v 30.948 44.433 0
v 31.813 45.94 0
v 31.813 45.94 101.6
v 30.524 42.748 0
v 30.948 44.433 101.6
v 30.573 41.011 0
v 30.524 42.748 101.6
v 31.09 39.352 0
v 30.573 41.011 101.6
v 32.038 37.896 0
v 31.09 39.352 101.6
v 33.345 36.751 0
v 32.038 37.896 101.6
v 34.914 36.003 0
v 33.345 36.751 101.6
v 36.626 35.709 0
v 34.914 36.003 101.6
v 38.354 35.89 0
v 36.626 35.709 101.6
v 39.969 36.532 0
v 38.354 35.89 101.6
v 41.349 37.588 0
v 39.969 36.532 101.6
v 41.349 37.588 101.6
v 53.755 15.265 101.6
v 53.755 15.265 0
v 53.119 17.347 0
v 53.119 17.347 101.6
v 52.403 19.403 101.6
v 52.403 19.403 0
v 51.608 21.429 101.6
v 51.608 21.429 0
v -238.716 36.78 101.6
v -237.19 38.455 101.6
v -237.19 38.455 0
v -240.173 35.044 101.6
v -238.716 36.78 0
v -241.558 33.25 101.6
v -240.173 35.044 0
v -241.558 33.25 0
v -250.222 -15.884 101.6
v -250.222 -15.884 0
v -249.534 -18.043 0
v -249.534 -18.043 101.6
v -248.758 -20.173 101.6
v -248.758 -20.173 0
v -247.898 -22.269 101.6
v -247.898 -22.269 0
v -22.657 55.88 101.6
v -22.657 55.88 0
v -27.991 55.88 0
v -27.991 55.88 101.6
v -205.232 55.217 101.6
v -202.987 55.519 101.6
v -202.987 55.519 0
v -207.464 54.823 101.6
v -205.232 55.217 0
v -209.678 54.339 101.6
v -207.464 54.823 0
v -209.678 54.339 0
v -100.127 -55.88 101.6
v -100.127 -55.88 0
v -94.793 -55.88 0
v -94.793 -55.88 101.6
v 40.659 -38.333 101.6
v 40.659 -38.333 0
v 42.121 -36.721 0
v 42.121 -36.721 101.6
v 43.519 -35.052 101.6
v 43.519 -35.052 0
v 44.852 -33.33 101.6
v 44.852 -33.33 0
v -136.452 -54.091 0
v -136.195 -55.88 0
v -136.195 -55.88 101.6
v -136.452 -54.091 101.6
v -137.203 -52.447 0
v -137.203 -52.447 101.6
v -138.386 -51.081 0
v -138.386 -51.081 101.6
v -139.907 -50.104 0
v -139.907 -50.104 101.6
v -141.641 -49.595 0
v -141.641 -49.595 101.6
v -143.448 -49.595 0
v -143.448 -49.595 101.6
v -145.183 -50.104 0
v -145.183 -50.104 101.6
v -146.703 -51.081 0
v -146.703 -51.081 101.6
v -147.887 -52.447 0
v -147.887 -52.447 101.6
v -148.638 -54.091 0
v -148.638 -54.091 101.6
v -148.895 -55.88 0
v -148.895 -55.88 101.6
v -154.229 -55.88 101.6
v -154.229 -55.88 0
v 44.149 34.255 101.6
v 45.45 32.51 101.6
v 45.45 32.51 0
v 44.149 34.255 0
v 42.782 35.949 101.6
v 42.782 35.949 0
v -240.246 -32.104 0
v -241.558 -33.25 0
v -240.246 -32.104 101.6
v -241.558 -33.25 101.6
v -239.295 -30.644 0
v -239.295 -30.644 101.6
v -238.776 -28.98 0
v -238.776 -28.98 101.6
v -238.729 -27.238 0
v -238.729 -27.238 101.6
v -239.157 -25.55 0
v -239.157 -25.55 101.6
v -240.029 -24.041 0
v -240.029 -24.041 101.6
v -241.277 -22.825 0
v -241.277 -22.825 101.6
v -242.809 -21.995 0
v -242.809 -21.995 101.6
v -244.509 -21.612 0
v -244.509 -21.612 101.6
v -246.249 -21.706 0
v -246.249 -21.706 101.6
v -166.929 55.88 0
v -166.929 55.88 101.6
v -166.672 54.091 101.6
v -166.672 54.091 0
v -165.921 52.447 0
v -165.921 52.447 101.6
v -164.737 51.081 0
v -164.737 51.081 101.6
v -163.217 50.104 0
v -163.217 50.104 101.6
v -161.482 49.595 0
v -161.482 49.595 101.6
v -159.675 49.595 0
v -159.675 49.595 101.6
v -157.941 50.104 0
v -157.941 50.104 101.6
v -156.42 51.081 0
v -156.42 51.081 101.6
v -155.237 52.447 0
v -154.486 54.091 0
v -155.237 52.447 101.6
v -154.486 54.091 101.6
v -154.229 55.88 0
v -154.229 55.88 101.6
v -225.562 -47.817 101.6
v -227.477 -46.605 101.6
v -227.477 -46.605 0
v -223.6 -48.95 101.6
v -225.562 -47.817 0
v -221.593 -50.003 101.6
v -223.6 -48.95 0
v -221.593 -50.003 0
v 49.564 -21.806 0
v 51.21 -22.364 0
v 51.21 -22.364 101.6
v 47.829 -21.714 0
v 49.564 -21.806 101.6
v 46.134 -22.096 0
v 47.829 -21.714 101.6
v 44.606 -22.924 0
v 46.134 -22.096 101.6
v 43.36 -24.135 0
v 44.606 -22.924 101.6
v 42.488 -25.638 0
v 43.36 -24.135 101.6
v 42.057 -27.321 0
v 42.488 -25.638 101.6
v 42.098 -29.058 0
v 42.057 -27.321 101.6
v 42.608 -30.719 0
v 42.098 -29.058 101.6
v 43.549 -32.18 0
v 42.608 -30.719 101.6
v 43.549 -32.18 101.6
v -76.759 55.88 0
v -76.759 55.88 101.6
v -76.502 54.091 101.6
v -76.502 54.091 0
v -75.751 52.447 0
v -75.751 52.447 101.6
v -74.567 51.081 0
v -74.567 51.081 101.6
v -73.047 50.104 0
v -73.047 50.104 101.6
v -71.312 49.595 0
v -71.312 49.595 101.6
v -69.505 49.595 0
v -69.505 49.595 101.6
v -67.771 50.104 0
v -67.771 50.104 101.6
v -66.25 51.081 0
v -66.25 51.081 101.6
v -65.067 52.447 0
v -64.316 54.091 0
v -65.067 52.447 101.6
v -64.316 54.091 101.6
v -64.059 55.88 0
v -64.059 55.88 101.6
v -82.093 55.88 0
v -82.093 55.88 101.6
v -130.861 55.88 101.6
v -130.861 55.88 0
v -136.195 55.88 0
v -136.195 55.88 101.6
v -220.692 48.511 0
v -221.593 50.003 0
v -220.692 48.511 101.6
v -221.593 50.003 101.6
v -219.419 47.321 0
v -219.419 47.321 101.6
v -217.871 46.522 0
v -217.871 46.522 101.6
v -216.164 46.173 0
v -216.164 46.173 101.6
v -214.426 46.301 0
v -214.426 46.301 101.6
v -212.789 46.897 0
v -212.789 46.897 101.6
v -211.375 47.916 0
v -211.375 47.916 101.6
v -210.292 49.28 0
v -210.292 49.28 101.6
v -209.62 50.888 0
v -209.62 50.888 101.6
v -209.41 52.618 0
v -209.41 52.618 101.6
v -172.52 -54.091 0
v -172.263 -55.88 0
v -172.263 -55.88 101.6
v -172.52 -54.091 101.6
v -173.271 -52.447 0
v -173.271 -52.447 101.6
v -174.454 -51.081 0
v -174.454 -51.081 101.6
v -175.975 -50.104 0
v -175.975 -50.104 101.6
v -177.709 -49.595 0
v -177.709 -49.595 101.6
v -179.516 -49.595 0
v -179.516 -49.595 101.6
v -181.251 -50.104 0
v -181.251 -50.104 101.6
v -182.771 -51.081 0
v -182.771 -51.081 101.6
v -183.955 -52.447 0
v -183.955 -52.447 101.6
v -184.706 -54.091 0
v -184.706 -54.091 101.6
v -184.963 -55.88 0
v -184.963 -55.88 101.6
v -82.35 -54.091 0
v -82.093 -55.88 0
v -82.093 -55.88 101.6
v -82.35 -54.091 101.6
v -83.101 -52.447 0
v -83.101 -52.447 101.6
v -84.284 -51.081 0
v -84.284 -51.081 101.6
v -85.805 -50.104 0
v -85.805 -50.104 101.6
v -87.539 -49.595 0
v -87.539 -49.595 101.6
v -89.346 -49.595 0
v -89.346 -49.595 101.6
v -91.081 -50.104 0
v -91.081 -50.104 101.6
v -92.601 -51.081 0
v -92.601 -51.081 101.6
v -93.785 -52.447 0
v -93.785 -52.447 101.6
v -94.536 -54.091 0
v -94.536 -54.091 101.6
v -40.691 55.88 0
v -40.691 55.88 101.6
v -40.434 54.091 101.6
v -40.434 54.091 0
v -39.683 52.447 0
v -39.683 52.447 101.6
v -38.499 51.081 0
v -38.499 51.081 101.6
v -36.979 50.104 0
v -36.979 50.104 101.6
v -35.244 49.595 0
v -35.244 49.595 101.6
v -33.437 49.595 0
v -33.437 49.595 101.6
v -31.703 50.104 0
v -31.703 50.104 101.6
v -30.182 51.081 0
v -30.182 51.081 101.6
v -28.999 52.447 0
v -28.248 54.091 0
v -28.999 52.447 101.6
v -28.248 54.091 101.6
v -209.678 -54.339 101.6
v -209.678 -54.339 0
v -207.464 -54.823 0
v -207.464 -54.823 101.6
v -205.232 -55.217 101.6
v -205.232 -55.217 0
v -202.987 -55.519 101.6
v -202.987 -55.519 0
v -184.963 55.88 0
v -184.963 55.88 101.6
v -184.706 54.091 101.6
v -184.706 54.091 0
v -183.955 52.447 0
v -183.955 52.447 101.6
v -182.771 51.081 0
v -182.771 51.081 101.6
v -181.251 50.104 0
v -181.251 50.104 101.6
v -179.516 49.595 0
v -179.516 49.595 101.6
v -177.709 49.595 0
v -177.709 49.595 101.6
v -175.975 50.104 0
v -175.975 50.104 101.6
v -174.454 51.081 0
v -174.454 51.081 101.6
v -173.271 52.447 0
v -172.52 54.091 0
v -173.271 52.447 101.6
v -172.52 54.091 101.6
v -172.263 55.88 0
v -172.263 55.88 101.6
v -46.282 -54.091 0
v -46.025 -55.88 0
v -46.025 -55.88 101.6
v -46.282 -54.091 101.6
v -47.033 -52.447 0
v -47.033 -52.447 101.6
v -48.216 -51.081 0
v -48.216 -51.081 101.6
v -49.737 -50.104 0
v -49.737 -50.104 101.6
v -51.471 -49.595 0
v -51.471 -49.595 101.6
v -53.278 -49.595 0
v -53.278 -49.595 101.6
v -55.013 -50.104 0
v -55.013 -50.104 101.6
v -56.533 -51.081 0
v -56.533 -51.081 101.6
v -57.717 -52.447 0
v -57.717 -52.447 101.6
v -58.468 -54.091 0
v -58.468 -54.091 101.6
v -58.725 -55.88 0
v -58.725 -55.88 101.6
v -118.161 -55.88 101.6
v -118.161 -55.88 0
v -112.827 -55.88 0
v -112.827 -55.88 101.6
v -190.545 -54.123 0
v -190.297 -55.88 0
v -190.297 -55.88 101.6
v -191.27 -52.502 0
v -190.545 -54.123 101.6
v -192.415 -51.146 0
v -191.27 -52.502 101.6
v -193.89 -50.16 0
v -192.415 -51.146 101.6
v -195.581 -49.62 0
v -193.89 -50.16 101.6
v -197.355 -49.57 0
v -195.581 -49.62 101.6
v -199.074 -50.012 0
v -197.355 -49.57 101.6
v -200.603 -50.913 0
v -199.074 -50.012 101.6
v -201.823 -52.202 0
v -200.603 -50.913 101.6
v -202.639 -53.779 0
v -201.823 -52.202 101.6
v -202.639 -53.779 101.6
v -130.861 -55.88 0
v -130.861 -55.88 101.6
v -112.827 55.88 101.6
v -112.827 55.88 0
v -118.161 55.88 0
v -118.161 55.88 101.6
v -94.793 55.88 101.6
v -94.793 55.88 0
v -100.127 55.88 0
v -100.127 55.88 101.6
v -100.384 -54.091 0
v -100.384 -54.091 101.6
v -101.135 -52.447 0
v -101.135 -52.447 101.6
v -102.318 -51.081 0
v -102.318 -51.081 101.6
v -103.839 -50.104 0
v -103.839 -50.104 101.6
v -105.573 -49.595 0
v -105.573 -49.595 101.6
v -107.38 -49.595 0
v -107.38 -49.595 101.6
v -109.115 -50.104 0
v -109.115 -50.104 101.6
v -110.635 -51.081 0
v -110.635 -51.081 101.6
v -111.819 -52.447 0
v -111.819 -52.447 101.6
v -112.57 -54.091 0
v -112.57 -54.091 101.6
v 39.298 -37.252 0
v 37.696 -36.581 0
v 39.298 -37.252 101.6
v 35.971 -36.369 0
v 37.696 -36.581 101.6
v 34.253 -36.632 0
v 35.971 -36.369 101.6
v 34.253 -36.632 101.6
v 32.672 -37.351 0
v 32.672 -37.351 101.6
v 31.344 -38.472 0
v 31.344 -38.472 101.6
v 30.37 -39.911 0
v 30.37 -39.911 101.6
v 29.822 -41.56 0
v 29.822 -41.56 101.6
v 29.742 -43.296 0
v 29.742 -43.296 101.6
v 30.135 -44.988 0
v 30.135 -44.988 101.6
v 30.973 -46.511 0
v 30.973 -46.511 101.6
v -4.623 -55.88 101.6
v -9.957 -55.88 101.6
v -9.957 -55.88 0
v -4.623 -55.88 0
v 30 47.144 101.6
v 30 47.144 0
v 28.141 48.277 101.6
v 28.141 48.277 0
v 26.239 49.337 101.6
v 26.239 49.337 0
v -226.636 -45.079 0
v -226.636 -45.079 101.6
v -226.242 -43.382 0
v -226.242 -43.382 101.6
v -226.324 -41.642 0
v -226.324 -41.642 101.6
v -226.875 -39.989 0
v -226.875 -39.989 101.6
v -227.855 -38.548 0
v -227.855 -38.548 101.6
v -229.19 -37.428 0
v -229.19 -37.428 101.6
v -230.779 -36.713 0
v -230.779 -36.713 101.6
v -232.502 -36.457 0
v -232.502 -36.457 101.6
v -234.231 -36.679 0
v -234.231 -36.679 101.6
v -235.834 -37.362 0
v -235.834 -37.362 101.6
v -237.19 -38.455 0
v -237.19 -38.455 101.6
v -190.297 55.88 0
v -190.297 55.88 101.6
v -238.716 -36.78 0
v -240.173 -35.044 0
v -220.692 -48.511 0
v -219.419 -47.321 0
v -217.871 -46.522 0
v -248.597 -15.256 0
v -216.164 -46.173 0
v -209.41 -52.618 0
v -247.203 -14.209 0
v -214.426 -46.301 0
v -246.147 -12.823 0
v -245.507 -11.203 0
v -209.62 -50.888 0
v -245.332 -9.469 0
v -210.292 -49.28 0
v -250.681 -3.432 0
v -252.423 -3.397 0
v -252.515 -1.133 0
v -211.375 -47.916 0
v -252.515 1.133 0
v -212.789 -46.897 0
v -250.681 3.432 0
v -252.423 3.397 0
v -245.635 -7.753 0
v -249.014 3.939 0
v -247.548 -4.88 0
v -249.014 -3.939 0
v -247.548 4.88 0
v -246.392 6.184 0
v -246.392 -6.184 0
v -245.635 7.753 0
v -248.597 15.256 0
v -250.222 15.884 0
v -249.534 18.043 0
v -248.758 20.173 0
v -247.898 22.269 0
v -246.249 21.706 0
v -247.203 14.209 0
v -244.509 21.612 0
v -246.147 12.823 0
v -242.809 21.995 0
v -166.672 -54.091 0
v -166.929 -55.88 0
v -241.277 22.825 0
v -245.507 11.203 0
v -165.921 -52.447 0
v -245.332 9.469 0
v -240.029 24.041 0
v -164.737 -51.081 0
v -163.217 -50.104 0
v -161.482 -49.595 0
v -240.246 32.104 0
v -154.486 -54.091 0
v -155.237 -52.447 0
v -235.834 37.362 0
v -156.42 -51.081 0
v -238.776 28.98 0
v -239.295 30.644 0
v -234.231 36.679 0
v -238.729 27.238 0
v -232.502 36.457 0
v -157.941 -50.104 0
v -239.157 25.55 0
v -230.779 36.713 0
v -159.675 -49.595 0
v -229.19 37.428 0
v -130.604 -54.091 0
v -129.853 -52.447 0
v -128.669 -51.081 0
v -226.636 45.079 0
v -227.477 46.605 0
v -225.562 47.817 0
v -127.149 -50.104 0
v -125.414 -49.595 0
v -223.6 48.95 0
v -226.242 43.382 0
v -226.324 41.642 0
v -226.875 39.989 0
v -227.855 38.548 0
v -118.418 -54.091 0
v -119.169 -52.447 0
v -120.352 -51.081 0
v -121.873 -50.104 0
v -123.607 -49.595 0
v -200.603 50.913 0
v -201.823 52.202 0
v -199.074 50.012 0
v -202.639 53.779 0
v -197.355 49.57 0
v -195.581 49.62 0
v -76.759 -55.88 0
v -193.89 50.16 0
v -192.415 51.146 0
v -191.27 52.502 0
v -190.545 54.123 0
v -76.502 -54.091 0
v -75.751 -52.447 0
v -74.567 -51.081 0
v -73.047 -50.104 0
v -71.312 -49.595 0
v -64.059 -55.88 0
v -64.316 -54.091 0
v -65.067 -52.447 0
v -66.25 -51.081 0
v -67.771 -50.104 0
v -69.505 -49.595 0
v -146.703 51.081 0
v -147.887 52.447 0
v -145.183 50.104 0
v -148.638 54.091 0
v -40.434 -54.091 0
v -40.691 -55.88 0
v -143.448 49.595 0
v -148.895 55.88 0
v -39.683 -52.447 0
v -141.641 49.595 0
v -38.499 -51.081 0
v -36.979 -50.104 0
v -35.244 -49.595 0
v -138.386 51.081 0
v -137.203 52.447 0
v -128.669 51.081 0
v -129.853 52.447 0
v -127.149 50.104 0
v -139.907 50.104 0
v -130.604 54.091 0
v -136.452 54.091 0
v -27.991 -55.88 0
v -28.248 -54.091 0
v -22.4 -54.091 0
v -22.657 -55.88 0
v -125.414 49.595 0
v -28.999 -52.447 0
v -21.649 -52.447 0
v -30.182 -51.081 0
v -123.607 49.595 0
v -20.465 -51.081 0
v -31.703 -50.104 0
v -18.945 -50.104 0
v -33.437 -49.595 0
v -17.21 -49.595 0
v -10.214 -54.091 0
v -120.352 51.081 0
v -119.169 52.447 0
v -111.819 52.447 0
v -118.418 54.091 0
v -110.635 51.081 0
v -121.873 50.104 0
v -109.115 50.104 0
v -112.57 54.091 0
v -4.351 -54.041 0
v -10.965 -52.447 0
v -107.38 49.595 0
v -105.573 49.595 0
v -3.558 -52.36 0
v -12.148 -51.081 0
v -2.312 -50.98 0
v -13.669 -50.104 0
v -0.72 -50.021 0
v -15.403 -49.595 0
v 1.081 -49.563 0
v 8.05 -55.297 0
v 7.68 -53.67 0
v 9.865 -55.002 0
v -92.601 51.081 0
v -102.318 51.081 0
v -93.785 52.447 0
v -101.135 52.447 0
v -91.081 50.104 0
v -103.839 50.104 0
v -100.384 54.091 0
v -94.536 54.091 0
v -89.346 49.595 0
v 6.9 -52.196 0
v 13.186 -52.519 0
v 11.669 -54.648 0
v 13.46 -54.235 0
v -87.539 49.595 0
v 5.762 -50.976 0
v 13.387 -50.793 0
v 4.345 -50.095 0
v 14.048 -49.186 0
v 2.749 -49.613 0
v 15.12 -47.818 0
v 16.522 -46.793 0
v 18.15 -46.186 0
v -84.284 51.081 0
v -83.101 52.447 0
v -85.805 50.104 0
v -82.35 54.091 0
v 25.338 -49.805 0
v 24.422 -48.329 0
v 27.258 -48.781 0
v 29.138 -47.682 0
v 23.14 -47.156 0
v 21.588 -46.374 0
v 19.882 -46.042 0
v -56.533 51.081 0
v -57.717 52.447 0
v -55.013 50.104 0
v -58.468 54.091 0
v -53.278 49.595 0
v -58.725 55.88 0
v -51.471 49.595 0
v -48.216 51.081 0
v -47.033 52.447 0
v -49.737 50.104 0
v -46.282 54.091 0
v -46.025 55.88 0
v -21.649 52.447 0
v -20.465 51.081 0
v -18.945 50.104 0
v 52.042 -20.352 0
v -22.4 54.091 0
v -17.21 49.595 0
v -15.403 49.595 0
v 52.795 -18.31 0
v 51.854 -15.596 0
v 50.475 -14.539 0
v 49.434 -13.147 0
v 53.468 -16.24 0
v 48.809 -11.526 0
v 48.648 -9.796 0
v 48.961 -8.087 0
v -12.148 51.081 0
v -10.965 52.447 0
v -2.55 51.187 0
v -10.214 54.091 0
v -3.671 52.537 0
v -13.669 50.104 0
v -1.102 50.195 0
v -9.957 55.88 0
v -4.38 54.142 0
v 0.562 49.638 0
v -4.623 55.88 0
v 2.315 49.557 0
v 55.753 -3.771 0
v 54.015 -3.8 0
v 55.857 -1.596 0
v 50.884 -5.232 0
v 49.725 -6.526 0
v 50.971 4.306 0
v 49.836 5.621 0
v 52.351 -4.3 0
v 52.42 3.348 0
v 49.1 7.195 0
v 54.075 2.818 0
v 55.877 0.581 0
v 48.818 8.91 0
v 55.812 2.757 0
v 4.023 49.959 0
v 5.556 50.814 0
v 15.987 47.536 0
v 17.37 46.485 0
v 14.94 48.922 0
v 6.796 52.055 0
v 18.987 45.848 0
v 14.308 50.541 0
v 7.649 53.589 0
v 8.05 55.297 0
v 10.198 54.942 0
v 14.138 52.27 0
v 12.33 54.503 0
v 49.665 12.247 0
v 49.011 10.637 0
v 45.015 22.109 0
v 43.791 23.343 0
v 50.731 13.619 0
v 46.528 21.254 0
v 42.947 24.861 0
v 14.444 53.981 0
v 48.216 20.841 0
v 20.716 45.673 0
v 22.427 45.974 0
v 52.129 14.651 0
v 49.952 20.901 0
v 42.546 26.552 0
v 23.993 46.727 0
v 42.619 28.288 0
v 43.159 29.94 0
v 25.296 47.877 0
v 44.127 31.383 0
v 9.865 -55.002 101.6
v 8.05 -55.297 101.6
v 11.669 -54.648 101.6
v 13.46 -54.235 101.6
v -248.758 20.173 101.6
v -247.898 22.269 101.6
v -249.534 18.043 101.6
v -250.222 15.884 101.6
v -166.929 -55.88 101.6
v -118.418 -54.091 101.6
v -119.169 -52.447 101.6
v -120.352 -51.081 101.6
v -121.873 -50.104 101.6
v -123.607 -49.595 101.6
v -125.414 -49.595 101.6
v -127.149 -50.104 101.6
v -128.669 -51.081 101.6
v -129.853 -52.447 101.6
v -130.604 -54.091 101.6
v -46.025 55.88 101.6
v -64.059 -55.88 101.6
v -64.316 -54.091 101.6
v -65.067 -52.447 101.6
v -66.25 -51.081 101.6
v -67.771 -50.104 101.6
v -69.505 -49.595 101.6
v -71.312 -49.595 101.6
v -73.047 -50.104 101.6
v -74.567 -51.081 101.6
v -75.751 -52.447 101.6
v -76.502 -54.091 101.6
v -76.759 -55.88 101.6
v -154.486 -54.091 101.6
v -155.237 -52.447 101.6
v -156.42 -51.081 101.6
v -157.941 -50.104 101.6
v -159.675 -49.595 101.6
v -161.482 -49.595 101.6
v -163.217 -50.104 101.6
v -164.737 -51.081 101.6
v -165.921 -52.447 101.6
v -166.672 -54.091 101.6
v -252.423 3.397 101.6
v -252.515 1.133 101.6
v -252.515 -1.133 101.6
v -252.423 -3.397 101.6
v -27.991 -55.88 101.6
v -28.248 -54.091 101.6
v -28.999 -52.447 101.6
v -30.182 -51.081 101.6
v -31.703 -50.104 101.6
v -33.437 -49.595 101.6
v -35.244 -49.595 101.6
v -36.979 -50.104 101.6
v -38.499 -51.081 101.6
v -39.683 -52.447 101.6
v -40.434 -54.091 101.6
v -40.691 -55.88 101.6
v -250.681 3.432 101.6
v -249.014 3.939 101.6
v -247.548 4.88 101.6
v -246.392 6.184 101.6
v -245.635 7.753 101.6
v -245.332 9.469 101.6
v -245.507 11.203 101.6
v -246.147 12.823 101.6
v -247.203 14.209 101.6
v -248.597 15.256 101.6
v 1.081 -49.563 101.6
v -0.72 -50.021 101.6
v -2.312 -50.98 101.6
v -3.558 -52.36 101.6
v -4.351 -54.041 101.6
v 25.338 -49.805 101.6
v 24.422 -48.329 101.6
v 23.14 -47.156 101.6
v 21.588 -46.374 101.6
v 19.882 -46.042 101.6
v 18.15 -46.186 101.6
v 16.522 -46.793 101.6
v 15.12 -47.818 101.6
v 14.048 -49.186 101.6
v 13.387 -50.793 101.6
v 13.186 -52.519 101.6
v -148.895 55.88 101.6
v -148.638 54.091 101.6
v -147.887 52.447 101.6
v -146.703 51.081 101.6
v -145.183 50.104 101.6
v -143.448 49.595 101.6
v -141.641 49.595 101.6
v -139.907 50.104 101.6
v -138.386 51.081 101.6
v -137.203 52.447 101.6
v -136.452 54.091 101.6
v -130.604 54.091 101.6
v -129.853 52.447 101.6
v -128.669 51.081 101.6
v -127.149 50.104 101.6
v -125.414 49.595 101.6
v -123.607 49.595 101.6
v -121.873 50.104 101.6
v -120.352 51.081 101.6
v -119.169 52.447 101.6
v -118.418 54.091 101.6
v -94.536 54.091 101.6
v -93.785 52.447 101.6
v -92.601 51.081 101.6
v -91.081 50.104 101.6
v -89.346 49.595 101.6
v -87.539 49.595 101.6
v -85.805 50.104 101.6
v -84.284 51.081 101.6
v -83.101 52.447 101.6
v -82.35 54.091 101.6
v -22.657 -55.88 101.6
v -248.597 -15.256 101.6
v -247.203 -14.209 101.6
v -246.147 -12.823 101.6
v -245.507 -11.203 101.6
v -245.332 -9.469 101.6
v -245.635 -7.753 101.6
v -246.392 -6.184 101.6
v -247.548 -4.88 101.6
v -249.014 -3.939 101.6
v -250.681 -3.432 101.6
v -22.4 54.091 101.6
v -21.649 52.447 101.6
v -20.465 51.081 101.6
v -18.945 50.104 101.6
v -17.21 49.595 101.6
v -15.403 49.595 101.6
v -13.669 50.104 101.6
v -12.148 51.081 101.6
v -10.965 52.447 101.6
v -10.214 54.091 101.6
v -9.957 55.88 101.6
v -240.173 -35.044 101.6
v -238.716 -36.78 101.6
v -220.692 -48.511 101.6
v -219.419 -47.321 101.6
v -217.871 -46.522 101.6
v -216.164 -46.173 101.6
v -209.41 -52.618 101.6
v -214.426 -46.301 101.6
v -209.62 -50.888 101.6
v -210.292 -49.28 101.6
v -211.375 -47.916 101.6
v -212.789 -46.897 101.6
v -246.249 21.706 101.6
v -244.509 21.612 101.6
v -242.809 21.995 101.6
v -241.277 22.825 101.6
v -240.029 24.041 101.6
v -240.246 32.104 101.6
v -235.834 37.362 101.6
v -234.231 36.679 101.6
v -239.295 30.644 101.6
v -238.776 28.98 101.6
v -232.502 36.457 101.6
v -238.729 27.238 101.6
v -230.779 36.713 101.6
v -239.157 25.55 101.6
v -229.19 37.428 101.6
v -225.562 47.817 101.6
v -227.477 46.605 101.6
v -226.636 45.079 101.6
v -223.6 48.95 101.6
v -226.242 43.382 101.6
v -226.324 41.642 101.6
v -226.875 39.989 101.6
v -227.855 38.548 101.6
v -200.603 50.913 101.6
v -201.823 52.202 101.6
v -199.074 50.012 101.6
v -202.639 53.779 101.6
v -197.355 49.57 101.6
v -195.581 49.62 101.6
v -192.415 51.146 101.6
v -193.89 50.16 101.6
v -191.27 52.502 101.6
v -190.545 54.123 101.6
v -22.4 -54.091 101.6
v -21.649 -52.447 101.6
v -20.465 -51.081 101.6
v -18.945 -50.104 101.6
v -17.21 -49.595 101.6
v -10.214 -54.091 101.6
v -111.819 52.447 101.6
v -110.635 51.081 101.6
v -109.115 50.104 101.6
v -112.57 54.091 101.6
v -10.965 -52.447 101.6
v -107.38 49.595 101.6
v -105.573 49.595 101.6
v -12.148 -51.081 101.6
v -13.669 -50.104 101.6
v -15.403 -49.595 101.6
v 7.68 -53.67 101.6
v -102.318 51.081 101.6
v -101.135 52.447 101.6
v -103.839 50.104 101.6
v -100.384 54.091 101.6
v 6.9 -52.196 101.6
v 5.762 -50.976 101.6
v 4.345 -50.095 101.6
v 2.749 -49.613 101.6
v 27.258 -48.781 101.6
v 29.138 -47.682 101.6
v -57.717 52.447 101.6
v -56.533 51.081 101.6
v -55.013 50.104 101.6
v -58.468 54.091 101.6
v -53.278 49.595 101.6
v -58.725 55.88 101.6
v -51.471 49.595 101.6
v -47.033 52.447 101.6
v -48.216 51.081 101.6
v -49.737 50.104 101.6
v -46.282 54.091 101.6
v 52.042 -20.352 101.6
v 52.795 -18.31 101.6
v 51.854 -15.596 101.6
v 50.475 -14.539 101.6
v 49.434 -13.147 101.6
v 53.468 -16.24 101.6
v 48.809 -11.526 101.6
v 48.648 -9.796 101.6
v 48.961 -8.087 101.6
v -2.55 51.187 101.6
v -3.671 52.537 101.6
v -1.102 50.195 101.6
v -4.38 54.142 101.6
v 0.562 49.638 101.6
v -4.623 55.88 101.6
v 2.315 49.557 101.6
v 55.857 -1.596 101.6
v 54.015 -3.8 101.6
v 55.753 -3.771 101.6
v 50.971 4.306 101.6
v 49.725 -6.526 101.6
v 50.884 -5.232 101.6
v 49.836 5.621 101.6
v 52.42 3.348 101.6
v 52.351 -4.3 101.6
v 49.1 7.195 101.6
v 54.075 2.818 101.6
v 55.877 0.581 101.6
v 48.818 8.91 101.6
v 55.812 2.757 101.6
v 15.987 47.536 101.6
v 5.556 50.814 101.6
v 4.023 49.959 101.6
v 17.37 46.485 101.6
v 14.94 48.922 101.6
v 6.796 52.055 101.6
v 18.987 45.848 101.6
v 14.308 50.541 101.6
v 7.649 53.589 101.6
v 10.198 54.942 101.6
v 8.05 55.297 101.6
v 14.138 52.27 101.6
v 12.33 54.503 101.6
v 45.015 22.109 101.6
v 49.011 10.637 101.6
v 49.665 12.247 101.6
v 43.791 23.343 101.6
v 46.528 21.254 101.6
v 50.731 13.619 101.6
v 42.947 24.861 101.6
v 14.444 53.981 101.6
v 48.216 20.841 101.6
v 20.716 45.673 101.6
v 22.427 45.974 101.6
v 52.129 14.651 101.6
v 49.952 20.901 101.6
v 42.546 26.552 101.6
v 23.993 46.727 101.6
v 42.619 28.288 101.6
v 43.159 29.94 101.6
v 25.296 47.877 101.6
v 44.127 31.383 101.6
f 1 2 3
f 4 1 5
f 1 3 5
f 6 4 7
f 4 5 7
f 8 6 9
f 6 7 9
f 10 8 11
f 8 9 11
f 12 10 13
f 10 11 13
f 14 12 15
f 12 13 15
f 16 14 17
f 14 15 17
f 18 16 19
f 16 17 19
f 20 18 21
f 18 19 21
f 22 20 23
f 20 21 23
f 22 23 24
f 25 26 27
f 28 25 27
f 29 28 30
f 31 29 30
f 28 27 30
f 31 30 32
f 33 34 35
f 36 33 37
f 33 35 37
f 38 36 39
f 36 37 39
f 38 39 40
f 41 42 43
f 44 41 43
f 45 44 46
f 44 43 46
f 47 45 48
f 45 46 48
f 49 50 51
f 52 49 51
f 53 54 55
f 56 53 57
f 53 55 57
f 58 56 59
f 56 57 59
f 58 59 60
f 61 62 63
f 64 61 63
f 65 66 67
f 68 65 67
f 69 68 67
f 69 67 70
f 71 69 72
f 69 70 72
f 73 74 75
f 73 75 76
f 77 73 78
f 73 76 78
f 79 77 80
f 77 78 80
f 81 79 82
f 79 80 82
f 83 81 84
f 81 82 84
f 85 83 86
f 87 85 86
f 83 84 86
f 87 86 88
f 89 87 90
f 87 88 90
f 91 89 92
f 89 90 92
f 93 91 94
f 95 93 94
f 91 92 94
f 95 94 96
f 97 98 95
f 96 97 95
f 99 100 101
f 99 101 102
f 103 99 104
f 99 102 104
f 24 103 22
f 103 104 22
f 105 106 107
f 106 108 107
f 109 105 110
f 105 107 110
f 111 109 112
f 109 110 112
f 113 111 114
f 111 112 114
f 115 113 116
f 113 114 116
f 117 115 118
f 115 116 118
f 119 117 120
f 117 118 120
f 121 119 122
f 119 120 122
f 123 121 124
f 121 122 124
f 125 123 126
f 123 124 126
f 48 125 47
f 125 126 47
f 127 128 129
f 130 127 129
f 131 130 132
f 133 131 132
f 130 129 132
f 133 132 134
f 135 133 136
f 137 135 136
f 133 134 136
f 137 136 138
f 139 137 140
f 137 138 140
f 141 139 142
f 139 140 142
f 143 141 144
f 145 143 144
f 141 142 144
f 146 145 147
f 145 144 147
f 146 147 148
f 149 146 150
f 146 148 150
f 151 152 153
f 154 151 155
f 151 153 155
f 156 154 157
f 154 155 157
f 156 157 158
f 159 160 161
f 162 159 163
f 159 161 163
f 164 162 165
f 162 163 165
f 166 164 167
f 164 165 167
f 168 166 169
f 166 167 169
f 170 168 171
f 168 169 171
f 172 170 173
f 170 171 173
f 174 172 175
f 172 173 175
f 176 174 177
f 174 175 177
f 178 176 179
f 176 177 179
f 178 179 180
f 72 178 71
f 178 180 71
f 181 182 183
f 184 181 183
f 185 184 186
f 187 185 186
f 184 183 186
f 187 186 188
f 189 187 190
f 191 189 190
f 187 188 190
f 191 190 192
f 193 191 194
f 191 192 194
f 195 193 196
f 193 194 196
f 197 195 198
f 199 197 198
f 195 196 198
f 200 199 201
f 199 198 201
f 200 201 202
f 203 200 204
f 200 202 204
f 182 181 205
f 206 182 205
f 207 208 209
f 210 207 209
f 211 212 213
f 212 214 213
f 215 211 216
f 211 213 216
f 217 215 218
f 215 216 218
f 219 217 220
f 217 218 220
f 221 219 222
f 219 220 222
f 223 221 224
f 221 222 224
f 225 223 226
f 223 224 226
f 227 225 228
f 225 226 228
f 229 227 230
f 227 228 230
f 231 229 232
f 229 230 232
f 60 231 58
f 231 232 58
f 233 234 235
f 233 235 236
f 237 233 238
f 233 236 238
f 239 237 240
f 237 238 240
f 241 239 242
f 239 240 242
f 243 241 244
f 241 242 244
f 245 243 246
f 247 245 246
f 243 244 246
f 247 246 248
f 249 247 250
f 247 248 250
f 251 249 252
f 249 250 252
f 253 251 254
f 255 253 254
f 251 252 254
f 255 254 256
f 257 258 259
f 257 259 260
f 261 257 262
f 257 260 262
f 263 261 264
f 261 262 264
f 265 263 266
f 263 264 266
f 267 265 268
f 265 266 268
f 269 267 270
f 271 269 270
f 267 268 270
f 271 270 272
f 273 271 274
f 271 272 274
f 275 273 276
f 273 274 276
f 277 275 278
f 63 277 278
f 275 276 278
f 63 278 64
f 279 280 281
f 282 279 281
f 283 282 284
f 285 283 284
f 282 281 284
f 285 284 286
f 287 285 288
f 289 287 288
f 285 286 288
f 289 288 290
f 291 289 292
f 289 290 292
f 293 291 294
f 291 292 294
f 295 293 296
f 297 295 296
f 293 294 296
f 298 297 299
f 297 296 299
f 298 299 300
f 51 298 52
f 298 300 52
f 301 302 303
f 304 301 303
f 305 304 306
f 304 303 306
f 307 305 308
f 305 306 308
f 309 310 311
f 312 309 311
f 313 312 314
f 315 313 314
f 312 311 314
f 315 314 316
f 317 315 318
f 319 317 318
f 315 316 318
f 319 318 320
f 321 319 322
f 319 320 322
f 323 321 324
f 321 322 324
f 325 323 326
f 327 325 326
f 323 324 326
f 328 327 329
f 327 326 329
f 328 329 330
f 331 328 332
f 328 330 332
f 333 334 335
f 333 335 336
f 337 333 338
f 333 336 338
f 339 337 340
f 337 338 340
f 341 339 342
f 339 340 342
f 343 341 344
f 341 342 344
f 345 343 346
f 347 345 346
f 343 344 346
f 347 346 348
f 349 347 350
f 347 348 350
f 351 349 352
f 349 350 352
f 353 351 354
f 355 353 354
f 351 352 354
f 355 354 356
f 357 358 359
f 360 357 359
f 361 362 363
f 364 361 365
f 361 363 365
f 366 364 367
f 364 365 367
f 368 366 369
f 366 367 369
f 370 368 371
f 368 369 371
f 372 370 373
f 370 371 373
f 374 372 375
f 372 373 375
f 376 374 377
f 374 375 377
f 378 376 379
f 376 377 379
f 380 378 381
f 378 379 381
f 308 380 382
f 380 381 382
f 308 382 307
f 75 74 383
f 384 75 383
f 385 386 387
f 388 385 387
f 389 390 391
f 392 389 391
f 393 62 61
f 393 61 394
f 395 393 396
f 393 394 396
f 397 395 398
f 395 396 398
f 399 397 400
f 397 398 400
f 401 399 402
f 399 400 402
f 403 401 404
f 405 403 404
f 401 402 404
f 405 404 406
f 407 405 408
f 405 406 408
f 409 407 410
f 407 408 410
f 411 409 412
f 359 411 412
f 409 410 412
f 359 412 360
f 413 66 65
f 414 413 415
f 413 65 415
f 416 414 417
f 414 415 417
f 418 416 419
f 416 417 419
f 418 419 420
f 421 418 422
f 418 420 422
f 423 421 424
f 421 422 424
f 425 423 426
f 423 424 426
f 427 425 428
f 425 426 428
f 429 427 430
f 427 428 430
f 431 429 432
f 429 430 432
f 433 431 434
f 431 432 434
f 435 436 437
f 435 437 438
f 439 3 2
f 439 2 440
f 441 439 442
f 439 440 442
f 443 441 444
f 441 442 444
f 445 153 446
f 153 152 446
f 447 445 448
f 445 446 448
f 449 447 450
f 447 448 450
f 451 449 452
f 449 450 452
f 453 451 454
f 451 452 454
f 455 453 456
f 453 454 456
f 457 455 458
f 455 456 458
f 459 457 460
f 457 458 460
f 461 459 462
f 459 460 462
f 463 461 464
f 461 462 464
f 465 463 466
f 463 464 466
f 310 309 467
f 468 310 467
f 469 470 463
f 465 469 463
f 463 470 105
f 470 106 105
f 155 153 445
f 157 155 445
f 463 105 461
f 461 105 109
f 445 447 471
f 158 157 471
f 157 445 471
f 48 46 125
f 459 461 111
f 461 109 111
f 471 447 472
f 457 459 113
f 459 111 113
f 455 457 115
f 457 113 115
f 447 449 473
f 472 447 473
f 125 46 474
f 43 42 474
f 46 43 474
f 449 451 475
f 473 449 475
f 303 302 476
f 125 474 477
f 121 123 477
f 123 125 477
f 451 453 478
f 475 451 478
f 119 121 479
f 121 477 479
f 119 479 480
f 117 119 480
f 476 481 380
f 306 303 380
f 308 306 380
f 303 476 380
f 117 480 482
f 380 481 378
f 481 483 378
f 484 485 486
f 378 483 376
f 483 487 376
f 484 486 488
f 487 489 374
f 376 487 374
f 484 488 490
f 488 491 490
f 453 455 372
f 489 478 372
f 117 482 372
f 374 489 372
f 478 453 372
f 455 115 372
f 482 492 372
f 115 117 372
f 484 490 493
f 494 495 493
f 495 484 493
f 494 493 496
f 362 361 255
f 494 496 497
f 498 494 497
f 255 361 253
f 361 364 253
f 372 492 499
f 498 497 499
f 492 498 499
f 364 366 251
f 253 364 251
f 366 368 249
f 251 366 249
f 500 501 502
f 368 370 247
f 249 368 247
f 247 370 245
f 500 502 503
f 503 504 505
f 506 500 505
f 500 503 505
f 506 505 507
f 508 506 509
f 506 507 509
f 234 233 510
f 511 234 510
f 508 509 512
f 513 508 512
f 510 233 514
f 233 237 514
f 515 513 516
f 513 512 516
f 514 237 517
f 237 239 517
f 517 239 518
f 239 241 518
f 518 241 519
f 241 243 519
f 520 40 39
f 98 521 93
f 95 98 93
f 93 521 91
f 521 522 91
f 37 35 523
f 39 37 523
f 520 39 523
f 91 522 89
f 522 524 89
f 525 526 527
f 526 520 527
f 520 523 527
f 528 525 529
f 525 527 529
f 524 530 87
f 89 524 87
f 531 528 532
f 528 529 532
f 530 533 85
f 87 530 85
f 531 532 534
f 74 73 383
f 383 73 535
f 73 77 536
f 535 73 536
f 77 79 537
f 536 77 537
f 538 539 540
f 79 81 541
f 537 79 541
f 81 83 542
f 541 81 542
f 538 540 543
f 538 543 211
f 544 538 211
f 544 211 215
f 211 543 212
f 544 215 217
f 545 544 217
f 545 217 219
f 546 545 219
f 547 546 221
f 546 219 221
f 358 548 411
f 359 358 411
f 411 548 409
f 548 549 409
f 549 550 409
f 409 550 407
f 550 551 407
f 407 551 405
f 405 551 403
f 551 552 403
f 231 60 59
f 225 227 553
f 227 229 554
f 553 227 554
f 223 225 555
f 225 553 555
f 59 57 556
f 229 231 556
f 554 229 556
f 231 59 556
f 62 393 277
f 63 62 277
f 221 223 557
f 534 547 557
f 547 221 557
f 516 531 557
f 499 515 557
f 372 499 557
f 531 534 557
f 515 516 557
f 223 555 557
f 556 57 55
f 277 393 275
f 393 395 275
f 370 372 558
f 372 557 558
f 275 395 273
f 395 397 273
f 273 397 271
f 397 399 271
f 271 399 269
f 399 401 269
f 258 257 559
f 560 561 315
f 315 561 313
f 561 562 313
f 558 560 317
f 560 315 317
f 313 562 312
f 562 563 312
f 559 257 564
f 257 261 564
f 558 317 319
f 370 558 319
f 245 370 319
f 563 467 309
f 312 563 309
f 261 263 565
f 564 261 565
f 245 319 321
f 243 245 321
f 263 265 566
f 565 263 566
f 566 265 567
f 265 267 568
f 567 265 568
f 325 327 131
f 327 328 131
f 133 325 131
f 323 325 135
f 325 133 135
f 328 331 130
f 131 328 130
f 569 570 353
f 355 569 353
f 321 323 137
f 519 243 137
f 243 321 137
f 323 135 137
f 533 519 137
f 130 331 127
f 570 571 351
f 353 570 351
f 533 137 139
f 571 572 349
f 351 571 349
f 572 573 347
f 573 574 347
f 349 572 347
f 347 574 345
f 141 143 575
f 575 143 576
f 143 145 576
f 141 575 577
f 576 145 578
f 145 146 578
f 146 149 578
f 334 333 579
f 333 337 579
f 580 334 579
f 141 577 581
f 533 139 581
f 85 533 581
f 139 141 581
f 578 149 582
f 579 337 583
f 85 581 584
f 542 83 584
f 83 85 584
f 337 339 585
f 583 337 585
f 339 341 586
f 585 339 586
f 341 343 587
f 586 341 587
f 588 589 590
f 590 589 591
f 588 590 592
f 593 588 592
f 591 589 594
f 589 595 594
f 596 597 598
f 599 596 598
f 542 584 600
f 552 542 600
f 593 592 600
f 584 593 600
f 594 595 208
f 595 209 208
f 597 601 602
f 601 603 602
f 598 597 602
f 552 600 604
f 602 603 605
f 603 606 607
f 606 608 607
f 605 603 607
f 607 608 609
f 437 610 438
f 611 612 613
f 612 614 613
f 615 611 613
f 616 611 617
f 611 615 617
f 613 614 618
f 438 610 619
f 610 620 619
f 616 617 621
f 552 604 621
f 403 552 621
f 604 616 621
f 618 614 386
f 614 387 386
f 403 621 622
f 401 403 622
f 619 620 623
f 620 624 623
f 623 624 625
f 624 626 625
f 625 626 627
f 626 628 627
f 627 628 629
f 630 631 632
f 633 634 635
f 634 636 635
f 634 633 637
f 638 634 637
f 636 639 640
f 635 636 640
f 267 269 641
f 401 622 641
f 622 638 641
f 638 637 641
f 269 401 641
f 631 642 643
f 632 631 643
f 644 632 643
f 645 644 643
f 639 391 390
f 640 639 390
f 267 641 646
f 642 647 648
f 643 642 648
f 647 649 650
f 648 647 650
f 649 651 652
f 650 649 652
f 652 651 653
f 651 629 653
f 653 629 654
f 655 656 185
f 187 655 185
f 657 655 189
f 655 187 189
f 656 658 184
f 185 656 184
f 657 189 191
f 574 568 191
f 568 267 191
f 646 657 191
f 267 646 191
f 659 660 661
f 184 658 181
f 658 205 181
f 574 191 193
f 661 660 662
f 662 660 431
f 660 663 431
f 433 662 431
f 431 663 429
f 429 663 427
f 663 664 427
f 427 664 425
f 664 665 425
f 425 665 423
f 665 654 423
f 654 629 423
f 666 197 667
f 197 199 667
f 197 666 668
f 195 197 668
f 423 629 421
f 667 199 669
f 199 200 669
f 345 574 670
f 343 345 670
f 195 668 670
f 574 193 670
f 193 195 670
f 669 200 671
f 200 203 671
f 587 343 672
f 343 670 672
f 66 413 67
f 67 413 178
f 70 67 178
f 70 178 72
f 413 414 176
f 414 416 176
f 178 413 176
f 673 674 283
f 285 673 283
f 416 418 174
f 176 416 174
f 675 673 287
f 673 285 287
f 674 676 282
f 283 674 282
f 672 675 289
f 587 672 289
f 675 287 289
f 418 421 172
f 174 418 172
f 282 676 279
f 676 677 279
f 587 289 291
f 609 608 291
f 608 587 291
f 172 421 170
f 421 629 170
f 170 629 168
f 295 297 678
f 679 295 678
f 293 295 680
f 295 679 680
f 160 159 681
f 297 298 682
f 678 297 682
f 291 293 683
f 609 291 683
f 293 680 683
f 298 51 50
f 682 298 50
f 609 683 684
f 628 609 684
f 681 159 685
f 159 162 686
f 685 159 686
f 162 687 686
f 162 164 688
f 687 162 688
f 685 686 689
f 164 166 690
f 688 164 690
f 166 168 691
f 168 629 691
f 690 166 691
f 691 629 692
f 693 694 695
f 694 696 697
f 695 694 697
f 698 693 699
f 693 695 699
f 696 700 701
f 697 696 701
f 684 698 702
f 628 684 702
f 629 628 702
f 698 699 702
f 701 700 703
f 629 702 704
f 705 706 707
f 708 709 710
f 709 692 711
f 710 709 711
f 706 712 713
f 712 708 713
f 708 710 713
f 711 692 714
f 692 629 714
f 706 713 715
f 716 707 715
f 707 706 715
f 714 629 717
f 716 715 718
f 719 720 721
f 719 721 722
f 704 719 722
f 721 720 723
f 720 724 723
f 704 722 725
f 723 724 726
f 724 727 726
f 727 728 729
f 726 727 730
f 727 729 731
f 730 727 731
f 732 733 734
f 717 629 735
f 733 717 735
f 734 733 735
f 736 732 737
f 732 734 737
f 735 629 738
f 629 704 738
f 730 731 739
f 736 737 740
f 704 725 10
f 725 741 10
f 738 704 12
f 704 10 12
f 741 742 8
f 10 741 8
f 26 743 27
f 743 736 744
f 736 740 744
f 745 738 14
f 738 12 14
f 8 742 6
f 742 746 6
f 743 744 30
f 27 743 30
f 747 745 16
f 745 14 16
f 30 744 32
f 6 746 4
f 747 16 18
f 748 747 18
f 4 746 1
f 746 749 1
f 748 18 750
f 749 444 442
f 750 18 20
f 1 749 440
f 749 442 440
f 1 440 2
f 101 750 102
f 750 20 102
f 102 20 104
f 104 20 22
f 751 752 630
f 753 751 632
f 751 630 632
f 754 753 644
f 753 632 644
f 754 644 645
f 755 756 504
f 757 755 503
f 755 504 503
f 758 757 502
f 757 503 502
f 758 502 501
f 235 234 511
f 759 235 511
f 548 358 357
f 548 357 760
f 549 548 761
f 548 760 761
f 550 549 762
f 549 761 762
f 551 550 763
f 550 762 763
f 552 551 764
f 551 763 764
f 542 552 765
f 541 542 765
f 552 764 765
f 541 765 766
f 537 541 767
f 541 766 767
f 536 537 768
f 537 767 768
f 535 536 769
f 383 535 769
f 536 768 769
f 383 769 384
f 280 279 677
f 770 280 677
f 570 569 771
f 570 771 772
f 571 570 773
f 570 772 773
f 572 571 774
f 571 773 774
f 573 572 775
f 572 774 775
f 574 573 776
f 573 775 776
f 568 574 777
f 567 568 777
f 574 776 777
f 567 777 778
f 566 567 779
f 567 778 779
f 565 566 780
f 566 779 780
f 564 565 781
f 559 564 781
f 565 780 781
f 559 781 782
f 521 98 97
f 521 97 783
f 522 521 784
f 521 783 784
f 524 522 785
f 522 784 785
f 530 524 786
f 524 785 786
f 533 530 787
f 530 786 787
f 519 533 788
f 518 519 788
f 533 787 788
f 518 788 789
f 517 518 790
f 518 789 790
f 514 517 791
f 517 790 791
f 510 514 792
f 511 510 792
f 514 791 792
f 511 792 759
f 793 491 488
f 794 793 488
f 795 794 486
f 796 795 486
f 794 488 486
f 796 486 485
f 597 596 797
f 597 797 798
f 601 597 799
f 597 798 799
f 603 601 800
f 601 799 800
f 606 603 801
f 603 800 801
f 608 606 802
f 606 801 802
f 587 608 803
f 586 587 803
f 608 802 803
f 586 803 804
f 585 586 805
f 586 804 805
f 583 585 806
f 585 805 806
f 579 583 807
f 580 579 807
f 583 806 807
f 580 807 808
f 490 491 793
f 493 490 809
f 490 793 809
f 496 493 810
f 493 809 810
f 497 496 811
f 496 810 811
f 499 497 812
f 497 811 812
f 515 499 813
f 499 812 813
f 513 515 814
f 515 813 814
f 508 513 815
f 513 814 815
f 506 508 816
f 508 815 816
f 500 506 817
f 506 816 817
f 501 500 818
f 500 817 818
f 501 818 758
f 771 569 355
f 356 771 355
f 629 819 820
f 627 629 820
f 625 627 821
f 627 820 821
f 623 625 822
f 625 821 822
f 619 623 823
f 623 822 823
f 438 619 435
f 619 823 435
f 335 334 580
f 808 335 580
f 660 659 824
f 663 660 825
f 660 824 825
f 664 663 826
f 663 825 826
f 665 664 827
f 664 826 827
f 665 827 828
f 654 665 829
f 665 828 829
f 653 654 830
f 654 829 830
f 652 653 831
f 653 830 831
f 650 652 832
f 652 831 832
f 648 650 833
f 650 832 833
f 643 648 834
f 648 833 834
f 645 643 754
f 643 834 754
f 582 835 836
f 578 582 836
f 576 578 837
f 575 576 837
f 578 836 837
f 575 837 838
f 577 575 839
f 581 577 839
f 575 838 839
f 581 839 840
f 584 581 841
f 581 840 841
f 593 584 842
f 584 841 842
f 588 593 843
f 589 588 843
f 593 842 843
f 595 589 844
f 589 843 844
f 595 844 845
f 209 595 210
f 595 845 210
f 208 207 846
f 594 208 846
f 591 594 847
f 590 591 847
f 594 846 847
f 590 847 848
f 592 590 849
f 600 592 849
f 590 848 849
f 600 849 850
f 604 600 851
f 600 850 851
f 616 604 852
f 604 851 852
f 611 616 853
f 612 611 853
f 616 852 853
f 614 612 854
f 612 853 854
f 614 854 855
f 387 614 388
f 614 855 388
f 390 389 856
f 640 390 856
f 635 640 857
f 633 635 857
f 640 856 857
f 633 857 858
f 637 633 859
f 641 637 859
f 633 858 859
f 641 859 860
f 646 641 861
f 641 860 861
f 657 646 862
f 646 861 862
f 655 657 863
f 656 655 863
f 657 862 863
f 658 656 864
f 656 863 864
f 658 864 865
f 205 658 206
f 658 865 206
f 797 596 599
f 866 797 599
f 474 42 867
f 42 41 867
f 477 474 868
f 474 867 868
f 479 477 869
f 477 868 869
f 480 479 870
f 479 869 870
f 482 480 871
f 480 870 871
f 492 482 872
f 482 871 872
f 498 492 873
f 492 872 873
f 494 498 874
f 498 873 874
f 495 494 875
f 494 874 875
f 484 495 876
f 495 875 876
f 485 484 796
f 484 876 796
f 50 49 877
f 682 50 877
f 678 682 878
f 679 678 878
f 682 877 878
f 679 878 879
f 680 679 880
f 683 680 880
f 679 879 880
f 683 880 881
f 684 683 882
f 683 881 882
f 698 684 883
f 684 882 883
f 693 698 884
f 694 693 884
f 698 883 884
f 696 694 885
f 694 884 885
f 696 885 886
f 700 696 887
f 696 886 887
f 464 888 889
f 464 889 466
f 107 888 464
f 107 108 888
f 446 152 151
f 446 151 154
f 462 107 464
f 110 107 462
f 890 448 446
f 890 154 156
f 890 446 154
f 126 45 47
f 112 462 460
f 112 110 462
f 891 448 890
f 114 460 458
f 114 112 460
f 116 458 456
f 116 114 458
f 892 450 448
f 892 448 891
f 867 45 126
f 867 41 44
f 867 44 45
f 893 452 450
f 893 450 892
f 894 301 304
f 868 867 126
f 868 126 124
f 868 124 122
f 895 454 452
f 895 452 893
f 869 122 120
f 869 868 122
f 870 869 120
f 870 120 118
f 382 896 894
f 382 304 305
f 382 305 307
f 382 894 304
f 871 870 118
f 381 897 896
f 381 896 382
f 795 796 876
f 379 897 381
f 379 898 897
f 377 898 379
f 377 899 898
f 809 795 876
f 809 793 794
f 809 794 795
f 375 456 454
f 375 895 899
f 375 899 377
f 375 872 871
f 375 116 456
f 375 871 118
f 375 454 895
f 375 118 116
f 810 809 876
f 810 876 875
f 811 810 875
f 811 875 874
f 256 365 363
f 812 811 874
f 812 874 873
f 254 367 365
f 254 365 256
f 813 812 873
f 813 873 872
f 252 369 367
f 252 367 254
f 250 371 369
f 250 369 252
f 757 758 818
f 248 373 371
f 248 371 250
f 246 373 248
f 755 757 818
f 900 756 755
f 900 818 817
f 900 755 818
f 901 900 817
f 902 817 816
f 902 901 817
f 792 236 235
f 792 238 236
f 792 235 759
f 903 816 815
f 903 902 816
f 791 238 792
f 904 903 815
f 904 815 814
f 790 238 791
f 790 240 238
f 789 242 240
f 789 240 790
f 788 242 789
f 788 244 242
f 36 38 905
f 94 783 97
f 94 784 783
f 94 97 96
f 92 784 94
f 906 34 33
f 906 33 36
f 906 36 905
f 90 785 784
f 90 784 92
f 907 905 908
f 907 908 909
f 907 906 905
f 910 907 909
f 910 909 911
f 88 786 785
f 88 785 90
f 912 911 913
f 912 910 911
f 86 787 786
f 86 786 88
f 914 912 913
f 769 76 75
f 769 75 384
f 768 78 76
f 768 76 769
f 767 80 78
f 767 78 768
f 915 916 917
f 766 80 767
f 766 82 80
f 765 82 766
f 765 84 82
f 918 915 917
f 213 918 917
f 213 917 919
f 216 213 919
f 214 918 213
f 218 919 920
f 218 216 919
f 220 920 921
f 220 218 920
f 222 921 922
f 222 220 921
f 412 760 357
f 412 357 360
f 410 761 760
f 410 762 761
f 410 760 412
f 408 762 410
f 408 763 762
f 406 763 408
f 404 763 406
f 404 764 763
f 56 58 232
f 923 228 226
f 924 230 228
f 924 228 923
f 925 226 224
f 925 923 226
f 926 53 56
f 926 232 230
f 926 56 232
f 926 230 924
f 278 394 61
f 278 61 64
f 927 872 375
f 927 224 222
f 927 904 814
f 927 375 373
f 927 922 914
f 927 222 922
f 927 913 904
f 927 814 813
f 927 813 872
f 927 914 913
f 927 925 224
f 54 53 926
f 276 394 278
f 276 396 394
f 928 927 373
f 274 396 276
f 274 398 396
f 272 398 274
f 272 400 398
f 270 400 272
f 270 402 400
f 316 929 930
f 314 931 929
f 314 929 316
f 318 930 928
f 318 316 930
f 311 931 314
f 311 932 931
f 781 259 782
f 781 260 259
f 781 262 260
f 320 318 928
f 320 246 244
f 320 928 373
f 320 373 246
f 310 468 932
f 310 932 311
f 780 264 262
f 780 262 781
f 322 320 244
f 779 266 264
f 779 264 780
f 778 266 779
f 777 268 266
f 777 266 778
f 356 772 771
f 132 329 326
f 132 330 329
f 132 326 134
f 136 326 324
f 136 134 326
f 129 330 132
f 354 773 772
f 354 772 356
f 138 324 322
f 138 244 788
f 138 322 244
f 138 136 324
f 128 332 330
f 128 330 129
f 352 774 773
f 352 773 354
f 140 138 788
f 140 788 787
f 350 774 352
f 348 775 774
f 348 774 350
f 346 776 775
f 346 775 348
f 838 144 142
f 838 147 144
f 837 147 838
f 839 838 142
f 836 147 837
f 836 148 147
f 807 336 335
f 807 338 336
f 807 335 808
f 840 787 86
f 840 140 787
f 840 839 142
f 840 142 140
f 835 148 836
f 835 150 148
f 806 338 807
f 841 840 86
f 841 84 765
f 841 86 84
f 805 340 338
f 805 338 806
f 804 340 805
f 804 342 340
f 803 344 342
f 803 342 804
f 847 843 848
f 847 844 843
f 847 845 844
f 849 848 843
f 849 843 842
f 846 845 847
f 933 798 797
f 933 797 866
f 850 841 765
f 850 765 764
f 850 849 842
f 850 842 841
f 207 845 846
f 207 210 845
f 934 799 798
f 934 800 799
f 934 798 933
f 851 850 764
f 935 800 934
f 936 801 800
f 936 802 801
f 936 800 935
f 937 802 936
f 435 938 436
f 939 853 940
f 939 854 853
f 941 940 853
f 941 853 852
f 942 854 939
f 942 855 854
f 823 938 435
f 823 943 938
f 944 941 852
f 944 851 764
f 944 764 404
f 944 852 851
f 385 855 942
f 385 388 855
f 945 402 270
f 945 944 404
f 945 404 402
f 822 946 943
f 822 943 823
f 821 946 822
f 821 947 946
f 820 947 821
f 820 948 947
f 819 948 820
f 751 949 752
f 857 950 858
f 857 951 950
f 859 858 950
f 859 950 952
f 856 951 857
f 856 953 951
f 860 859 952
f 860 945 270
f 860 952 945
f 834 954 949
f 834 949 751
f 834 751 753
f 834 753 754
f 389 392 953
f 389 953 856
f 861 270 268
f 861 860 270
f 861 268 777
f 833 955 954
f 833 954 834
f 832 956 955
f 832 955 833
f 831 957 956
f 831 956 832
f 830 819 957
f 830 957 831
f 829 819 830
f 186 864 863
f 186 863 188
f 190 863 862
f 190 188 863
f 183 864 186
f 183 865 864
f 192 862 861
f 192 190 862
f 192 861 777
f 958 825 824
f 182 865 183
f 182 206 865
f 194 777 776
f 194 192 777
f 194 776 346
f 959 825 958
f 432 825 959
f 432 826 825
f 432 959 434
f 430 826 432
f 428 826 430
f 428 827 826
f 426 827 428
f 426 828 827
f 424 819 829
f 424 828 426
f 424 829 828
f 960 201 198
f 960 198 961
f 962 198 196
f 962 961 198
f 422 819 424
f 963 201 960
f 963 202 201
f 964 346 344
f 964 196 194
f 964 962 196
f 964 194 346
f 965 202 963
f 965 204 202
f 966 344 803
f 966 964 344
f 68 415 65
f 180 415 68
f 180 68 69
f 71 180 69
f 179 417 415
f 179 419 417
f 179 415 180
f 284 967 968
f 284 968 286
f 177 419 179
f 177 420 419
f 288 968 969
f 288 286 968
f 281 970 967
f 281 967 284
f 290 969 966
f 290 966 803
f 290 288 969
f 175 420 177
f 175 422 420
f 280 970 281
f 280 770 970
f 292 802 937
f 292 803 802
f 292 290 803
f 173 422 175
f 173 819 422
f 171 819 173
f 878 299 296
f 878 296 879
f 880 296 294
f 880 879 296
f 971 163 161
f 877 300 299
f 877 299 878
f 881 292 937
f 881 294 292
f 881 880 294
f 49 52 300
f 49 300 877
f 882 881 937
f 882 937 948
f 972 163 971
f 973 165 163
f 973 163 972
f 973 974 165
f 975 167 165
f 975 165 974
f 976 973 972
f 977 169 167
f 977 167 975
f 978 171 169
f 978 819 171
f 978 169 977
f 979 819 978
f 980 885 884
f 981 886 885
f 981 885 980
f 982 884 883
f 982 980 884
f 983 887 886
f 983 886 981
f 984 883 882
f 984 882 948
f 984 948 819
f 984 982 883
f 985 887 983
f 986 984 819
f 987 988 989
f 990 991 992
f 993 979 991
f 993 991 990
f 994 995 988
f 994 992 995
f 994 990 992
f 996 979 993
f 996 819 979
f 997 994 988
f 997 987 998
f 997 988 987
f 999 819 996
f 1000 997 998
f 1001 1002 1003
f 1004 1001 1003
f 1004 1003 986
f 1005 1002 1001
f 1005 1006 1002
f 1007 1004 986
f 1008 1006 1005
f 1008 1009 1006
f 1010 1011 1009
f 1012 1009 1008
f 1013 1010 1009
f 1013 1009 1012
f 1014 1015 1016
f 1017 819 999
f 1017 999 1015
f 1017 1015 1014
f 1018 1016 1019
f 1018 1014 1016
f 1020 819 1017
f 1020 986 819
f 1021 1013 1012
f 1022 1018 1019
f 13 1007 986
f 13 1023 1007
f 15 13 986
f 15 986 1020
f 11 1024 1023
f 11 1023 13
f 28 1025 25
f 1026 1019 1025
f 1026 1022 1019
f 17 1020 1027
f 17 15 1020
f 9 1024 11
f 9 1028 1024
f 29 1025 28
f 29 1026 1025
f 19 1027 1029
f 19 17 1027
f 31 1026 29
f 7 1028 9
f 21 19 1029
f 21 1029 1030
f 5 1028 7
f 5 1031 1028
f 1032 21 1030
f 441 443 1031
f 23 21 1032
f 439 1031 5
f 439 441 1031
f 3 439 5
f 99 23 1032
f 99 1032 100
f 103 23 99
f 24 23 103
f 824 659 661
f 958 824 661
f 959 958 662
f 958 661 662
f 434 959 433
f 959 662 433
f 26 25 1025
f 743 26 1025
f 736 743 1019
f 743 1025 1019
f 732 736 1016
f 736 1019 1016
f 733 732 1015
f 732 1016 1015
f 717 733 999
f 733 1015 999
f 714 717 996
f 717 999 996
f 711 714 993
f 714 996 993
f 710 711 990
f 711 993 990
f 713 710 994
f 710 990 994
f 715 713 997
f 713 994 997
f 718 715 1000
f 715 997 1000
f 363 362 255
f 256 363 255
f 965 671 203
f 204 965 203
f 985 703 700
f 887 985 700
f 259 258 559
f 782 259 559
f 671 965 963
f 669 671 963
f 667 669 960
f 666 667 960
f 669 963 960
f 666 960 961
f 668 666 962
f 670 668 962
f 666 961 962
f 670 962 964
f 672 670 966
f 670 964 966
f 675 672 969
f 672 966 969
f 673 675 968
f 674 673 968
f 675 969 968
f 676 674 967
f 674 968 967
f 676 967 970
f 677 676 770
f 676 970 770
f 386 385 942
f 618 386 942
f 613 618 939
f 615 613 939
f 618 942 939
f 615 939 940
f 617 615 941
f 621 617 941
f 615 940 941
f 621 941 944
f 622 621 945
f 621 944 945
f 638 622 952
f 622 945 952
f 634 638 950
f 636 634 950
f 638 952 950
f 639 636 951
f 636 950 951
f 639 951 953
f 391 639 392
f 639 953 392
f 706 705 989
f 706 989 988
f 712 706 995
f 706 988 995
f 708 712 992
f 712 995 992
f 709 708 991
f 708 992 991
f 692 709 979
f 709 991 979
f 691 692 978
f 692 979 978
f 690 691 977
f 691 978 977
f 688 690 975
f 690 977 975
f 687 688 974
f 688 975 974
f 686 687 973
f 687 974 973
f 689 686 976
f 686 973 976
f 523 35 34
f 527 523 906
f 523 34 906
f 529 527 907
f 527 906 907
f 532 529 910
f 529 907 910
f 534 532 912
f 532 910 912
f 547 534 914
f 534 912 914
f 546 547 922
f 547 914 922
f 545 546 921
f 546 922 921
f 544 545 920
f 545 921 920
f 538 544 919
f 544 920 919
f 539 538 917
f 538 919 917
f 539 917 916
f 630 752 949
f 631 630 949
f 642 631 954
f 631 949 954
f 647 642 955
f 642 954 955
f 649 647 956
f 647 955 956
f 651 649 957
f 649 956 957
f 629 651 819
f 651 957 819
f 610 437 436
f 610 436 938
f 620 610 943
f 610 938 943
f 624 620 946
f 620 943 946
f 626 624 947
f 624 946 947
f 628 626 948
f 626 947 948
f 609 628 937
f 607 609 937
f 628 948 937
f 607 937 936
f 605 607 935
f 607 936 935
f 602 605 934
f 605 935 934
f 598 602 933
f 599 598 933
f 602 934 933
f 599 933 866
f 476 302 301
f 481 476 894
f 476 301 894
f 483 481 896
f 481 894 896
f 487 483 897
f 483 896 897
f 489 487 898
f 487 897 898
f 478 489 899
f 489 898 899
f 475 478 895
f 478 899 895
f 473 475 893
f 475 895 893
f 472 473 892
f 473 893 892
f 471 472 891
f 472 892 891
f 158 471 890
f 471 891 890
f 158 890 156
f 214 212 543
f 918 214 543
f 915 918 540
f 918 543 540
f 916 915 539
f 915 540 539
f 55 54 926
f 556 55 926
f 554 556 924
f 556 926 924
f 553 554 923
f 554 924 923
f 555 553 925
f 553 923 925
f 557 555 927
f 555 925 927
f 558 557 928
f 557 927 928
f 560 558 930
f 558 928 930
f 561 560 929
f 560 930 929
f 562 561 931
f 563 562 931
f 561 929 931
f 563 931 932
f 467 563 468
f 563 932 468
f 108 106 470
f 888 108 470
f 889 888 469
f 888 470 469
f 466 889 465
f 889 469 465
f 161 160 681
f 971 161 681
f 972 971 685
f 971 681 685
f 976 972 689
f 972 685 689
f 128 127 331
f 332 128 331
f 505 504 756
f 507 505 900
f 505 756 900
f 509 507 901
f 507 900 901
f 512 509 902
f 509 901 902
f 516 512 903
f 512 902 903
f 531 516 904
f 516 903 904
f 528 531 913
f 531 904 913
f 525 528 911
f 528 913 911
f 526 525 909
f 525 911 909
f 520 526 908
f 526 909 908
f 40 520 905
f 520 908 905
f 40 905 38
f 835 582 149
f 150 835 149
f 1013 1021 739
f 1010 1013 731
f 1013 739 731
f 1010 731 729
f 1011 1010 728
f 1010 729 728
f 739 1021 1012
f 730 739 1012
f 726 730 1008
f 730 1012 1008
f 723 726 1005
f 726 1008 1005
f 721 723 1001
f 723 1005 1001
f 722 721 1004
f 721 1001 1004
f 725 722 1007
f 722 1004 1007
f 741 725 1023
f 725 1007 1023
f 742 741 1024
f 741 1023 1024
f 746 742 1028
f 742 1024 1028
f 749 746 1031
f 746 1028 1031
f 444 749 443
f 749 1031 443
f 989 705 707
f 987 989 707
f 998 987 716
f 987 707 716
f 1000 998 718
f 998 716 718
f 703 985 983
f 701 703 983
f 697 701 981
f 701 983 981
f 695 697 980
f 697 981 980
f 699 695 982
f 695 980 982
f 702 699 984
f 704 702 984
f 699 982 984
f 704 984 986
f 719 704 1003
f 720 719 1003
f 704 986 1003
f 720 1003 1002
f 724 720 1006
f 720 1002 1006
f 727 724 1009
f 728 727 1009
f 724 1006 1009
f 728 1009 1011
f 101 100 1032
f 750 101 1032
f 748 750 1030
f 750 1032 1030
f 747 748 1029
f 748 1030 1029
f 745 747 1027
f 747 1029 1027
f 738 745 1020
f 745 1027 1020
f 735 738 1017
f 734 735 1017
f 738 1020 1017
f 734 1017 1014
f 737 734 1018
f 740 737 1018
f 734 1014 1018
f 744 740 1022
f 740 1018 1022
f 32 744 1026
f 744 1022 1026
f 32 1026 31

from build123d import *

# Parameters (mm, degrees)
F1_DEPTH = 101.6
F2_R     = 6.35
F3_DEPTH = 101.601


with BuildPart() as f1:
    # F0 (on Top) → F1 (new body)
    with BuildSketch(Plane.XY):
        with BuildLine():
            Line((0, 55.88), (-196.6468, 55.88))
            ThreePointArc((-196.6468, 55.88), (-252.5268, 0), (-196.6468, -55.88))
            Line((-196.6468, -55.88), (0, -55.88))
            ThreePointArc((0, -55.88), (55.88, 0), (0, 55.88))
        make_face()
    extrude(amount=F1_DEPTH)

    # F2 (on face) → F3 (cut, through all)
    with BuildSketch(Plane.XY.offset(101.6)):
        with Locations((-196.6468, 55.88)):
            Circle(F2_R)
        with Locations((-178.6128, 55.88)):
            Circle(F2_R)
        with Locations((-160.5788, 55.88)):
            Circle(F2_R)
        with Locations((-142.5448, 55.88)):
            Circle(F2_R)
        with Locations((-124.5108, 55.88)):
            Circle(F2_R)
        with Locations((-106.4768, 55.88)):
            Circle(F2_R)
        with Locations((-88.4428, 55.88)):
            Circle(F2_R)
        with Locations((-70.4088, 55.88)):
            Circle(F2_R)
        with Locations((-52.3748, 55.88)):
            Circle(F2_R)
        with Locations((-34.3408, 55.88)):
            Circle(F2_R)
        with Locations((-16.3068, 55.88)):
            Circle(F2_R)
        with Locations((1.7272, 55.88)):
            Circle(F2_R)
        with Locations((-196.6468, -55.88)):
            Circle(F2_R)
        with Locations((-178.6128, -55.88)):
            Circle(F2_R)
        with Locations((-160.5788, -55.88)):
            Circle(F2_R)
        with Locations((-142.5448, -55.88)):
            Circle(F2_R)
        with Locations((-124.5108, -55.88)):
            Circle(F2_R)
        with Locations((-106.4768, -55.88)):
            Circle(F2_R)
        with Locations((-88.4428, -55.88)):
            Circle(F2_R)
        with Locations((-70.4088, -55.88)):
            Circle(F2_R)
        with Locations((-52.3748, -55.88)):
            Circle(F2_R)
        with Locations((-34.3408, -55.88)):
            Circle(F2_R)
        with Locations((-16.3068, -55.88)):
            Circle(F2_R)
        with BuildLine():
            ThreePointArc((1.081132, -49.562952), (-2.528383, -60.593016), (8.0772, -55.88))
            ThreePointArc((8.0772, -55.88), (5.982783, -51.166984), (1.081132, -49.562952))
        make_face()
        with Locations((-215.758886, 52.510024)):
            Circle(F2_R)
        with Locations((-232.565772, 42.806563)):
            Circle(F2_R)
        with Locations((-245.0403, 27.94)):
            Circle(F2_R)
        with Locations((-251.677857, 9.70346)):
            Circle(F2_R)
        with Locations((-251.677857, -9.70346)):
            Circle(F2_R)
        with Locations((-245.0403, -27.94)):
            Circle(F2_R)
        with Locations((-232.565772, -42.806563)):
            Circle(F2_R)
        with Locations((-215.758886, -52.510024)):
            Circle(F2_R)
        with Locations((20.483246, 52.019172)):
            Circle(F2_R)
        with Locations((36.836167, 42.055374)):
            Circle(F2_R)
        with Locations((48.867411, 27.157574)):
            Circle(F2_R)
        with Locations((55.165454, 9.073605)):
            Circle(F2_R)
        with Locations((54.991401, -10.074893)):
            Circle(F2_R)
        with Locations((48.365671, -28.041389)):
            Circle(F2_R)
        with Locations((36.065606, -42.718026)):
            Circle(F2_R)
        with Locations((19.534267, -52.382917)):
            Circle(F2_R)
    extrude(amount=-F3_DEPTH, mode=Mode.SUBTRACT)


solid = f1.part
